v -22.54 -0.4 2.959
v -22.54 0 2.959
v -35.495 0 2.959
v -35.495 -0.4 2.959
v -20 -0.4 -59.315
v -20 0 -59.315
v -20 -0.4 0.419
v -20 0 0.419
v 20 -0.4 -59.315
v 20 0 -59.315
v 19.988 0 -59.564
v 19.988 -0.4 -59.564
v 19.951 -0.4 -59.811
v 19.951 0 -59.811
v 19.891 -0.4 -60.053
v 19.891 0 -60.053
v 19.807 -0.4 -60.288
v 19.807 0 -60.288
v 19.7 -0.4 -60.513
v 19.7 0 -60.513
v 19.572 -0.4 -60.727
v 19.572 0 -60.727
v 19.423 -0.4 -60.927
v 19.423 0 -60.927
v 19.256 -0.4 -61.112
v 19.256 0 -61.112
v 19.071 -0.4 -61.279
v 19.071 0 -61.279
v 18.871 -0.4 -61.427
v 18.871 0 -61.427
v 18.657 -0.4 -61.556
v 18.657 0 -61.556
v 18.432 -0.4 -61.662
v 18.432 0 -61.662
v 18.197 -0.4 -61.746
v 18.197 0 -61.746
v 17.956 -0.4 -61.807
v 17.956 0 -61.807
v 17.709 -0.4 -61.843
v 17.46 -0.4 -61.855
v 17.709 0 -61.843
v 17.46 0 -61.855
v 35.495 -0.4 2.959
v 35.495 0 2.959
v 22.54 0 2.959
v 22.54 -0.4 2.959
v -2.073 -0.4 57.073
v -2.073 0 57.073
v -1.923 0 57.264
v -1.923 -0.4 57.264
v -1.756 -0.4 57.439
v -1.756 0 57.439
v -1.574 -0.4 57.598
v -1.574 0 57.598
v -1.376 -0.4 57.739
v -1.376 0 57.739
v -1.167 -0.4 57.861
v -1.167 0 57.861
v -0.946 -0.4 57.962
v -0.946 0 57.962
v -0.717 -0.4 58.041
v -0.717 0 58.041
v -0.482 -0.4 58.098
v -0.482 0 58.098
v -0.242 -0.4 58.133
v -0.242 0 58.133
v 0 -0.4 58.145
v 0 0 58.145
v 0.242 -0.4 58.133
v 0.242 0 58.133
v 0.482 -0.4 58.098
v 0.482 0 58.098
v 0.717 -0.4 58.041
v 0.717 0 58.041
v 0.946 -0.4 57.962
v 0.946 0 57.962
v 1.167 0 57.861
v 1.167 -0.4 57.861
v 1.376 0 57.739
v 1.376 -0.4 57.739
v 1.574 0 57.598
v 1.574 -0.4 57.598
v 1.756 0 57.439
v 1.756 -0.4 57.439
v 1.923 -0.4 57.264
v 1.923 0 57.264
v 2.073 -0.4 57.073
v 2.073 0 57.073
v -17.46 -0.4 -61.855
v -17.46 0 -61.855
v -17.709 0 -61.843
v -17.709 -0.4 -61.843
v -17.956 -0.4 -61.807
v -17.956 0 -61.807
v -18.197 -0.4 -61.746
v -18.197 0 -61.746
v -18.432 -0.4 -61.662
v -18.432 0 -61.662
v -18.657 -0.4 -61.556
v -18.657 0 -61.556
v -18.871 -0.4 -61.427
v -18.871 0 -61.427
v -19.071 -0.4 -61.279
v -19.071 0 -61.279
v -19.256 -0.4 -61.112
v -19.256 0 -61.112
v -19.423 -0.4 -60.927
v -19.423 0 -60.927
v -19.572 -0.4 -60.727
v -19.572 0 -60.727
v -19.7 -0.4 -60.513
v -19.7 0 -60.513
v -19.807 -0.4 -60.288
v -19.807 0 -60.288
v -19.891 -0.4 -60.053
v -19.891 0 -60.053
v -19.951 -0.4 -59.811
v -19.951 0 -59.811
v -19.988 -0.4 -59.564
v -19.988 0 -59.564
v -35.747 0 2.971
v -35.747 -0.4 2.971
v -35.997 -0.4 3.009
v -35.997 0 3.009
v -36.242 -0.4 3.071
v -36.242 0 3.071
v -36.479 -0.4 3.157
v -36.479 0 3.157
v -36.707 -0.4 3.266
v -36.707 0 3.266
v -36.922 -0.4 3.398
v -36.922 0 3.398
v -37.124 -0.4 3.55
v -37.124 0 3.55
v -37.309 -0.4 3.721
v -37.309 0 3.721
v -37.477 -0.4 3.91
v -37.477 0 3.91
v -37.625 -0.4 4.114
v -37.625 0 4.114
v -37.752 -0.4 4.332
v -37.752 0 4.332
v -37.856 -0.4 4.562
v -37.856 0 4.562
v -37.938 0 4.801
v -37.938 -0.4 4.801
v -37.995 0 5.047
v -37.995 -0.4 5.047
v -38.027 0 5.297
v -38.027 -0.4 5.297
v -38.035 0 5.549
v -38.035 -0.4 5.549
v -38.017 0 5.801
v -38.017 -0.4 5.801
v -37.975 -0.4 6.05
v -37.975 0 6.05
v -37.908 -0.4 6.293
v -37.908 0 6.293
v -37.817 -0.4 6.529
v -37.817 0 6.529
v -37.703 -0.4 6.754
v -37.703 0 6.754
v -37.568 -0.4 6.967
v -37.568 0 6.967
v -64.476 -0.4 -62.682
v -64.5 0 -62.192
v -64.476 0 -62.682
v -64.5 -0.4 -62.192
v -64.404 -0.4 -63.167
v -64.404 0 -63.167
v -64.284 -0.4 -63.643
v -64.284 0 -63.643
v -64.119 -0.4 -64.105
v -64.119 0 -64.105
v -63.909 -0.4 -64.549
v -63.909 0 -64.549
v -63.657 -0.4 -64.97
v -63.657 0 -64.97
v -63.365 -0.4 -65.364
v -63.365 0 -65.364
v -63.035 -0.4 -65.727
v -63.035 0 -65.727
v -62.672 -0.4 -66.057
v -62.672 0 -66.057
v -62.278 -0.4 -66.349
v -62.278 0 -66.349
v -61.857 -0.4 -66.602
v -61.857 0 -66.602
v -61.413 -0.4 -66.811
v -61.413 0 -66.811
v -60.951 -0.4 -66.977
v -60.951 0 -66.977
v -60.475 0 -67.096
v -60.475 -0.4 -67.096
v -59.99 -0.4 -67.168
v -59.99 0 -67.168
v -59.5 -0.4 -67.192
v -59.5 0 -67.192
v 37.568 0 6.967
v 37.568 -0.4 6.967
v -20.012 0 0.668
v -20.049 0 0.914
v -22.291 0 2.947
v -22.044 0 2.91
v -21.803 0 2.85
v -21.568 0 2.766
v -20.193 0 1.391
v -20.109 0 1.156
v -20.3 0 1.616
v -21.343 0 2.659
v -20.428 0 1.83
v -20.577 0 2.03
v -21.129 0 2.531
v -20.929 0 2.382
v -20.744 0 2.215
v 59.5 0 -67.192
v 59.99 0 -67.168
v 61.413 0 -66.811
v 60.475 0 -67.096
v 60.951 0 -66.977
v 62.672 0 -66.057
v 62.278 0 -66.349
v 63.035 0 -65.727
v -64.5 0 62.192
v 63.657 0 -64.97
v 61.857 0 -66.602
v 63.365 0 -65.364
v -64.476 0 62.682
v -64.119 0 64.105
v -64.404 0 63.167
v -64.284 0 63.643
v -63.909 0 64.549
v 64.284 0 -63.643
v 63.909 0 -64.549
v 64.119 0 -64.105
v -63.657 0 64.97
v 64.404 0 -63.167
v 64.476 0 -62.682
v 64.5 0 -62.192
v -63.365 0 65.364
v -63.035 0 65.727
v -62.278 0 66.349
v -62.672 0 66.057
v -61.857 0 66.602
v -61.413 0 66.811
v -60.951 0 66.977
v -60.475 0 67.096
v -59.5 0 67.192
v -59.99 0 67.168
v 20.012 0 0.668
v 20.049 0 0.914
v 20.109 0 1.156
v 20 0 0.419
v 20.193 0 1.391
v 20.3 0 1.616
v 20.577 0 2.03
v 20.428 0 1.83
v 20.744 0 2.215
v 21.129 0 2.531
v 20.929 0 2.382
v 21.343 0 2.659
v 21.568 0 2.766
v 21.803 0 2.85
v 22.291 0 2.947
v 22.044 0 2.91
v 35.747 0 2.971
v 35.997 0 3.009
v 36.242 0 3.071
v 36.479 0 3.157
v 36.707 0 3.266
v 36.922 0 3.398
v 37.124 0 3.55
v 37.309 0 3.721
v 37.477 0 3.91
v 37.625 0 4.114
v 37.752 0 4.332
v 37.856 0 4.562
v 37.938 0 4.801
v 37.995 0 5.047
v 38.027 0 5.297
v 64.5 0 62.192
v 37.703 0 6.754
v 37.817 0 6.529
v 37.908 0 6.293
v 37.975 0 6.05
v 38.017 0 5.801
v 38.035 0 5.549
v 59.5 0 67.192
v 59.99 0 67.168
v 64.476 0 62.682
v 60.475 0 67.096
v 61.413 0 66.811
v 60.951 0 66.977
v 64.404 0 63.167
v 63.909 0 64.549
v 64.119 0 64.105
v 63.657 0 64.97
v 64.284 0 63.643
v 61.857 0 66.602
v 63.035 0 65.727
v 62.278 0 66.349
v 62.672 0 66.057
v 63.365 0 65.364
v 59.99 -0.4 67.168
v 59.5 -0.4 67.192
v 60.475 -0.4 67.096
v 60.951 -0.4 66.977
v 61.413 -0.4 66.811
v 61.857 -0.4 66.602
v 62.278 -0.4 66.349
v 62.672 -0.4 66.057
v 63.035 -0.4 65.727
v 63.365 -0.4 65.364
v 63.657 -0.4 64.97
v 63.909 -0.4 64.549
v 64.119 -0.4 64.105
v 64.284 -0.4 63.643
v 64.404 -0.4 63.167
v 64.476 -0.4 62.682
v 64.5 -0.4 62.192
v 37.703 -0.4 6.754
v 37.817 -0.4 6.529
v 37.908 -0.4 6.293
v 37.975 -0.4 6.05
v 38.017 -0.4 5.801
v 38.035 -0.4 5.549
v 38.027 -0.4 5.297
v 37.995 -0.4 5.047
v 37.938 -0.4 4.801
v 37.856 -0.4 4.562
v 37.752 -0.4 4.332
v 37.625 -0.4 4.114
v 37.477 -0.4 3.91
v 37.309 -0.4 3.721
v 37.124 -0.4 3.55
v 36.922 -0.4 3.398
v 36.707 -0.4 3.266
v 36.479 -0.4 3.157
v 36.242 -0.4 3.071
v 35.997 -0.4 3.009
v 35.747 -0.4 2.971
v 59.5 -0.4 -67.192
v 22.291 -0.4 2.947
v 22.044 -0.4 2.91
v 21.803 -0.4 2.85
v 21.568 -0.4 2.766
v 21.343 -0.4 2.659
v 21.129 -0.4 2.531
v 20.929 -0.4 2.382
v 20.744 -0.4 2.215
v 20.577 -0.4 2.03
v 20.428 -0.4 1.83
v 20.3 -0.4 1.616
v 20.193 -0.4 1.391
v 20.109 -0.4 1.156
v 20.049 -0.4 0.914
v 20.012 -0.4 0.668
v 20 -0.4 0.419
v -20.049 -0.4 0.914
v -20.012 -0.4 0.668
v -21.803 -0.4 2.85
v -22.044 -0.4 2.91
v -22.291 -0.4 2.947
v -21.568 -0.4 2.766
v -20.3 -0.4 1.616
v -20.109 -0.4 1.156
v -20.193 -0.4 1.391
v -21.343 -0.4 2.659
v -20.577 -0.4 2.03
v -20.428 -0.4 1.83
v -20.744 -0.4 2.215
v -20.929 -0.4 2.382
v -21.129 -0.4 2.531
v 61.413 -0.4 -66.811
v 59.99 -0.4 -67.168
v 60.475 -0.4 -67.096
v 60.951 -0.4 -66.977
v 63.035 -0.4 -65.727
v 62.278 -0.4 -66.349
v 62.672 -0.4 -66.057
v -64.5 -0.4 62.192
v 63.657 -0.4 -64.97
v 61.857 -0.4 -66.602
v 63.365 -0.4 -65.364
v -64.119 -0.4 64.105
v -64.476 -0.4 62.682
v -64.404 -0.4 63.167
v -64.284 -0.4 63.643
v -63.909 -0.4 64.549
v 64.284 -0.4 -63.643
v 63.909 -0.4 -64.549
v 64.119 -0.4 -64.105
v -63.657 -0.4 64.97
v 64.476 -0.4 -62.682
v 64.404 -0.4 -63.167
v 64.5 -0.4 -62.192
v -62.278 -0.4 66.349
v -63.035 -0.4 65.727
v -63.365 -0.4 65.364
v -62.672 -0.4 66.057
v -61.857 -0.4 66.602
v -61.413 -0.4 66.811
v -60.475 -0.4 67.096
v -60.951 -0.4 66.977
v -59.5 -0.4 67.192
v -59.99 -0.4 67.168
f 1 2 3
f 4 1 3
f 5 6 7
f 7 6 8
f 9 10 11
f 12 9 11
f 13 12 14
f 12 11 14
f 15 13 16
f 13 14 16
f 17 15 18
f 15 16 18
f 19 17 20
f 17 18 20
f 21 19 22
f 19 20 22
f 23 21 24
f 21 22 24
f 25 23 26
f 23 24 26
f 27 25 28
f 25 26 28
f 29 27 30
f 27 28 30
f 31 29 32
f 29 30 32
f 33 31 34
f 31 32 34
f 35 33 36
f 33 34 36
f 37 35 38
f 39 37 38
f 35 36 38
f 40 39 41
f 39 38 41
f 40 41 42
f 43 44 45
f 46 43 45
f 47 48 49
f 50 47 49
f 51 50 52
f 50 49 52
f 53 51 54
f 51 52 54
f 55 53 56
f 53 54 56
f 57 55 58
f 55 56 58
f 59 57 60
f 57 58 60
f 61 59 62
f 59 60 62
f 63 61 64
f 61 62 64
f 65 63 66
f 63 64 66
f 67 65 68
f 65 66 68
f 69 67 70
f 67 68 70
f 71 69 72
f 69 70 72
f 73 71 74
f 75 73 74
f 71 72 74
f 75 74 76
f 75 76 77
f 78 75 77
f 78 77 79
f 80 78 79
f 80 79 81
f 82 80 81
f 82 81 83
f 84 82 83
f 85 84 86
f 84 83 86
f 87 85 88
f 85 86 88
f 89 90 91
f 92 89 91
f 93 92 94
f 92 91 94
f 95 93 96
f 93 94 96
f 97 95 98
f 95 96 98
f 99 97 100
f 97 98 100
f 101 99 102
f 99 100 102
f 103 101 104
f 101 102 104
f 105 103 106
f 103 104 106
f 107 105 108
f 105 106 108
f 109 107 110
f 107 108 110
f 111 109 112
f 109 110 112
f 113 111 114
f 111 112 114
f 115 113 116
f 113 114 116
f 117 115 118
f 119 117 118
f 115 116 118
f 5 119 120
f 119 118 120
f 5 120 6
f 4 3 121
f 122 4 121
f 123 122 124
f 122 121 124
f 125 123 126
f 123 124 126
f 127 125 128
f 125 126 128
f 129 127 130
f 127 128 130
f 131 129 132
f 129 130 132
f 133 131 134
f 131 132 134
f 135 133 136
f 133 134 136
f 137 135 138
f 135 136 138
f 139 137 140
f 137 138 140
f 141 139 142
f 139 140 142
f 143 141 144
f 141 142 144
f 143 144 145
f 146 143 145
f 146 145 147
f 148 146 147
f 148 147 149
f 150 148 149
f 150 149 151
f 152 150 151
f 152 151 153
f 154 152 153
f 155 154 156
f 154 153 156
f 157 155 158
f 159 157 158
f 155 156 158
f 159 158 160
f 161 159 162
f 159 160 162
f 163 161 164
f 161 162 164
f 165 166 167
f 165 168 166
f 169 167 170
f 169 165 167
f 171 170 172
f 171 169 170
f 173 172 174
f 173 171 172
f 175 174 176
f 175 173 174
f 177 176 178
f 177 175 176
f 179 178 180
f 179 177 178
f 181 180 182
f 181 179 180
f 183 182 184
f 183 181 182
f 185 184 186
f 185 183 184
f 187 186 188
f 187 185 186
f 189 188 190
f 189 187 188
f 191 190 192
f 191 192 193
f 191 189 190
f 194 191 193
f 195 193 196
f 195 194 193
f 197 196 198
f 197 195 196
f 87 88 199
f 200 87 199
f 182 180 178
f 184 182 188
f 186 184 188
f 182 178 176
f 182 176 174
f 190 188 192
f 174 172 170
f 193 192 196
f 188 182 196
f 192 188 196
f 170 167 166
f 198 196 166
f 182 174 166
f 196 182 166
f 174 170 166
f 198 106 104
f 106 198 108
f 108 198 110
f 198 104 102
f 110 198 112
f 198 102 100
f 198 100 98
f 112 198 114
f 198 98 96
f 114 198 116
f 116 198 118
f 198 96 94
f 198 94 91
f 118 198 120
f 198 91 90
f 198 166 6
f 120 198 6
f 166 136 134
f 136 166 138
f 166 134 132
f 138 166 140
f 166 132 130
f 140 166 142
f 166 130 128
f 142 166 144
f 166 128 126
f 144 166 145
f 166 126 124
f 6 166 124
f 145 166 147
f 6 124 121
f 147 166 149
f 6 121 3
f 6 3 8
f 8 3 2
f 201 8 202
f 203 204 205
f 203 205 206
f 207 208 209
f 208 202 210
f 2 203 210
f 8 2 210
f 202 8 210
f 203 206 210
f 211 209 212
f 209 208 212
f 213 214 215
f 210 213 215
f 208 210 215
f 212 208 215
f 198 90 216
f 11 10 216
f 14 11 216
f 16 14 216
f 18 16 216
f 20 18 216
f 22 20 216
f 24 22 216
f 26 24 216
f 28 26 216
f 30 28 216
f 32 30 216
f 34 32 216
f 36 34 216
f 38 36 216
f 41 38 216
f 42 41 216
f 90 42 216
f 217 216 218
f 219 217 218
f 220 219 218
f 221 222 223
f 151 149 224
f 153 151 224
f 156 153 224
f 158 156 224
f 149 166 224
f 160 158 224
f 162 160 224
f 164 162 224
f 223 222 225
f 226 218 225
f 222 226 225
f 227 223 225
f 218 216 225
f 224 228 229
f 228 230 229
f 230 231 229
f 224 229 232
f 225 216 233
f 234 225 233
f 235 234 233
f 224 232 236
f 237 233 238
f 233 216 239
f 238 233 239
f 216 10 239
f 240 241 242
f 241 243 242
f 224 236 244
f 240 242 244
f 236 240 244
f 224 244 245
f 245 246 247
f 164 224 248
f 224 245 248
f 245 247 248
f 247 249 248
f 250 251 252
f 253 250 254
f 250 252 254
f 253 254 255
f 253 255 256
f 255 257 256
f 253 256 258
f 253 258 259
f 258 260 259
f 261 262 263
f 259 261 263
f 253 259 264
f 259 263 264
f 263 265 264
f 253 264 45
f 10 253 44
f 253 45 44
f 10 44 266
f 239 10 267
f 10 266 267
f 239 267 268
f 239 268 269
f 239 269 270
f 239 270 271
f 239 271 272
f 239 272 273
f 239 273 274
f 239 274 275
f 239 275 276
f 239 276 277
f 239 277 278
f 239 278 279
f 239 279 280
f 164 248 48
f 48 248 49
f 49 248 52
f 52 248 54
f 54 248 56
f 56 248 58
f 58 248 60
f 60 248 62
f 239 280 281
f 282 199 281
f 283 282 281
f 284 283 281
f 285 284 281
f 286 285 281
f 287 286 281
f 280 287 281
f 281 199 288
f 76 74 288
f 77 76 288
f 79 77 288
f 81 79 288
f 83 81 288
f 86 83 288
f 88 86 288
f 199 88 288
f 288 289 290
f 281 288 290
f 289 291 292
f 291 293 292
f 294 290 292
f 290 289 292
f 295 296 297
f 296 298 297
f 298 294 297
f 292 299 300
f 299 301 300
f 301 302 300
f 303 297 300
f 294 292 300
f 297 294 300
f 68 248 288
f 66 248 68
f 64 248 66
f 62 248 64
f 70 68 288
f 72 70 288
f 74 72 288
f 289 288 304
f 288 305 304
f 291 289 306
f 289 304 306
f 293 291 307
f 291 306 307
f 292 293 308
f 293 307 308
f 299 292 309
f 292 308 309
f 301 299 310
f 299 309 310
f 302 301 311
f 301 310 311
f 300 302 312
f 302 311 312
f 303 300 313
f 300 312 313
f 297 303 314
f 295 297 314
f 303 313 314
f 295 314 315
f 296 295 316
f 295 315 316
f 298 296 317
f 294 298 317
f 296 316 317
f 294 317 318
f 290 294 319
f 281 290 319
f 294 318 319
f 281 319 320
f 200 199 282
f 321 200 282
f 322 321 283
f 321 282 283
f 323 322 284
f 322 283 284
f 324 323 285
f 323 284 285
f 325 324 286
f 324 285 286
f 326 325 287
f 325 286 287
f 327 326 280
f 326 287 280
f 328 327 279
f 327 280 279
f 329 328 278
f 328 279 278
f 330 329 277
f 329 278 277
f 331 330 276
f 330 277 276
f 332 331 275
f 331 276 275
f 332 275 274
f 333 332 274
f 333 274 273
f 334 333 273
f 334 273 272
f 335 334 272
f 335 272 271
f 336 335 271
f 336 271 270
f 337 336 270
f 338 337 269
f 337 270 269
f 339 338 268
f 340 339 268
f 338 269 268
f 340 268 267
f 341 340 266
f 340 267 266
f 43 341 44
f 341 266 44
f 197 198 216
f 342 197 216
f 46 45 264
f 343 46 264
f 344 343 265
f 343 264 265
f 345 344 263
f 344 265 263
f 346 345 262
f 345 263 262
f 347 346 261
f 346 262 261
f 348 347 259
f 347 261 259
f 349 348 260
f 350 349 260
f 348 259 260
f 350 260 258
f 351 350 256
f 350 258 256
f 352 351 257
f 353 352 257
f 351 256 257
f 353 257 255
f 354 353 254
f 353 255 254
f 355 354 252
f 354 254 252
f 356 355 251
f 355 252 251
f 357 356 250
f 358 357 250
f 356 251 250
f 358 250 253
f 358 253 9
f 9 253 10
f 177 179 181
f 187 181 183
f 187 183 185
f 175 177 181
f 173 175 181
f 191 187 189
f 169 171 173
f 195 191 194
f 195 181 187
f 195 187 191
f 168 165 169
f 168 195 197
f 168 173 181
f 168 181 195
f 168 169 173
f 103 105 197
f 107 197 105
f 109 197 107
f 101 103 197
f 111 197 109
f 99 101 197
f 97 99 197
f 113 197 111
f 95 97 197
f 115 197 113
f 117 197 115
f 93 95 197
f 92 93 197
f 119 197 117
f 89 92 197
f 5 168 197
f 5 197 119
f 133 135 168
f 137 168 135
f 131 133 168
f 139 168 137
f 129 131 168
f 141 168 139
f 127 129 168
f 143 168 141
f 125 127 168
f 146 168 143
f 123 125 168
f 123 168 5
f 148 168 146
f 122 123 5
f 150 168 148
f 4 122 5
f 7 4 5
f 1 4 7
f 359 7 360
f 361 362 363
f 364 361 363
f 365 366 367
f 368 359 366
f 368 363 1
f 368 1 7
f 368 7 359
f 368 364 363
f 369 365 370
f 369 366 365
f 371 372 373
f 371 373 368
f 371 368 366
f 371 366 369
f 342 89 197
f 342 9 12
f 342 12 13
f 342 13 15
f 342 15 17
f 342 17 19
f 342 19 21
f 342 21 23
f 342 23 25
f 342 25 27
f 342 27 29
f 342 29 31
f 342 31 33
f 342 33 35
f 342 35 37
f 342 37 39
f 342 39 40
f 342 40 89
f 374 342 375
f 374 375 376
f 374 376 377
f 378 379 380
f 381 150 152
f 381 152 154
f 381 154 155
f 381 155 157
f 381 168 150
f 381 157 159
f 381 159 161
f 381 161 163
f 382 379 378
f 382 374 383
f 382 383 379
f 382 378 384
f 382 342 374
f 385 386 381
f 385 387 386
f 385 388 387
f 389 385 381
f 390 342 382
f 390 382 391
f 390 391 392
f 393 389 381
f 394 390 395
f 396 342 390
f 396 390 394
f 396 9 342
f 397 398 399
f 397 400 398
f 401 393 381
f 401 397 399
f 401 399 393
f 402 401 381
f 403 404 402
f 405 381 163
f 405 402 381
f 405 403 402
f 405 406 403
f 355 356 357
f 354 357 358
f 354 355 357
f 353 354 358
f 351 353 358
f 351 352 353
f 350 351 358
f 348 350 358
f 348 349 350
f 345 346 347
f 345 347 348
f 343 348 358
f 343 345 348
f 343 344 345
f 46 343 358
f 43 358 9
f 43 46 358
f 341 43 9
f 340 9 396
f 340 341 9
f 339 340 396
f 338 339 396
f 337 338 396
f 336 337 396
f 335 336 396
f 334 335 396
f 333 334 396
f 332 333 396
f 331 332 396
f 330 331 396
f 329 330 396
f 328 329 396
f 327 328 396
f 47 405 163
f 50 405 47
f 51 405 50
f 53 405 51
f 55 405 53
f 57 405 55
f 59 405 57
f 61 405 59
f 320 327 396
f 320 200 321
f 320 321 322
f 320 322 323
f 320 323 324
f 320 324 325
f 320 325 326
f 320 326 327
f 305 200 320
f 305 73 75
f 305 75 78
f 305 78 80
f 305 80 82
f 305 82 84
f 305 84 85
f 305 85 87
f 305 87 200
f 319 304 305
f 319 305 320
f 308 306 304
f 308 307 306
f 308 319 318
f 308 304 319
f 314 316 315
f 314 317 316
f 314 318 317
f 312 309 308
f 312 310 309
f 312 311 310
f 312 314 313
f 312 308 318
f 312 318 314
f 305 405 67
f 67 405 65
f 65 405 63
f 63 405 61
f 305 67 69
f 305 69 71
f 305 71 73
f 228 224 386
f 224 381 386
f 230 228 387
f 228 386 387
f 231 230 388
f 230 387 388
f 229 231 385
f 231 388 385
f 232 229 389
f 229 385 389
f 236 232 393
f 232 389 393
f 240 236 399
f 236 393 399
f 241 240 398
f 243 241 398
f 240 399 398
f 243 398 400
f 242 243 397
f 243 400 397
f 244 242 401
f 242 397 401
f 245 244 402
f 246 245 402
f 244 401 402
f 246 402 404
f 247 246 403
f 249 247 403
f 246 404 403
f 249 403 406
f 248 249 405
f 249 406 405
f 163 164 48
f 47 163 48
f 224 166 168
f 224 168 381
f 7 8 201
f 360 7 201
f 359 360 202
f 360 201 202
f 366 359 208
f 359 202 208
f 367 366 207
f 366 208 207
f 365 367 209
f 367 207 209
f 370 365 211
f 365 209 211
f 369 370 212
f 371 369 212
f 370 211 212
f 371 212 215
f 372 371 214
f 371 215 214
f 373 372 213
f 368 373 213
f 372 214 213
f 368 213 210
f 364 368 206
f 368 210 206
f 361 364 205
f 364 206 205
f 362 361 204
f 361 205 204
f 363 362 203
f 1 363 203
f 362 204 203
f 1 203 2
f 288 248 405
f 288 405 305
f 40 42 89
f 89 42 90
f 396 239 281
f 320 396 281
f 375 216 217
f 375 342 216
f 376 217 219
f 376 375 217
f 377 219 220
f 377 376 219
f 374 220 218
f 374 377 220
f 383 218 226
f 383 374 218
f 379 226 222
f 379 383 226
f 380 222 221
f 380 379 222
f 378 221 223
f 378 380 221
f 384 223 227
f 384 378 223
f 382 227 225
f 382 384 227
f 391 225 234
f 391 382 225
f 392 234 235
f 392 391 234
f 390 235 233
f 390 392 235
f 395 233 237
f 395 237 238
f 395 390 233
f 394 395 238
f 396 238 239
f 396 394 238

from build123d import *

# Parameters (mm, degrees)
F0_W     = 128.999456
F0_H     = 134.383812
F1_DEPTH = 0.4
F2_R     = 5


with BuildPart() as f1:
    # F0 (on Front) → F1 (new body)
    with BuildSketch(Plane.XZ):
        Rectangle(F0_W, F0_H)
        with BuildLine():
            Line((17.46, -61.855495), (0, -61.855495))
            Line((0, -61.855495), (-17.46, -61.855495))
            ThreePointArc((-17.46, -61.855495), (-19.256051, -61.111547), (-20, -59.315495))
            Line((-20, -59.315495), (-20, 0.418954))
            ThreePointArc((-20, 0.418954), (-20.743949, 2.215005), (-22.54, 2.958954))
            Line((-22.54, 2.958954), (-35.495363, 2.958954))
            ThreePointArc((-35.495363, 2.958954), (-37.751578, 4.332294), (-37.567989, 6.967226))
            Line((-37.567989, 6.967226), (-2.072625, 57.072777))
            ThreePointArc((-2.072625, 57.072777), (0, 58.144505), (2.072625, 57.072777))
            Line((2.072625, 57.072777), (37.567989, 6.967226))
            ThreePointArc((37.567989, 6.967226), (37.751578, 4.332294), (35.495363, 2.958954))
            Line((35.495363, 2.958954), (22.54, 2.958954))
            ThreePointArc((22.54, 2.958954), (20.743949, 2.215005), (20, 0.418954))
            Line((20, 0.418954), (20, -59.315495))
            ThreePointArc((20, -59.315495), (19.256051, -61.111547), (17.46, -61.855495))
        make_face(mode=Mode.SUBTRACT)
    extrude(amount=F1_DEPTH)

    # F2
    f2_edges = [f1.edges().sort_by_distance(p)[0] for p in [
        (-64.499728, -0.2, 67.191906),
        (64.499728, -0.2, 67.191906),
        (64.499728, -0.2, -67.191906),
        (-64.499728, -0.2, -67.191906),
    ]]
    fillet(f2_edges, radius=F2_R)


solid = f1.part
